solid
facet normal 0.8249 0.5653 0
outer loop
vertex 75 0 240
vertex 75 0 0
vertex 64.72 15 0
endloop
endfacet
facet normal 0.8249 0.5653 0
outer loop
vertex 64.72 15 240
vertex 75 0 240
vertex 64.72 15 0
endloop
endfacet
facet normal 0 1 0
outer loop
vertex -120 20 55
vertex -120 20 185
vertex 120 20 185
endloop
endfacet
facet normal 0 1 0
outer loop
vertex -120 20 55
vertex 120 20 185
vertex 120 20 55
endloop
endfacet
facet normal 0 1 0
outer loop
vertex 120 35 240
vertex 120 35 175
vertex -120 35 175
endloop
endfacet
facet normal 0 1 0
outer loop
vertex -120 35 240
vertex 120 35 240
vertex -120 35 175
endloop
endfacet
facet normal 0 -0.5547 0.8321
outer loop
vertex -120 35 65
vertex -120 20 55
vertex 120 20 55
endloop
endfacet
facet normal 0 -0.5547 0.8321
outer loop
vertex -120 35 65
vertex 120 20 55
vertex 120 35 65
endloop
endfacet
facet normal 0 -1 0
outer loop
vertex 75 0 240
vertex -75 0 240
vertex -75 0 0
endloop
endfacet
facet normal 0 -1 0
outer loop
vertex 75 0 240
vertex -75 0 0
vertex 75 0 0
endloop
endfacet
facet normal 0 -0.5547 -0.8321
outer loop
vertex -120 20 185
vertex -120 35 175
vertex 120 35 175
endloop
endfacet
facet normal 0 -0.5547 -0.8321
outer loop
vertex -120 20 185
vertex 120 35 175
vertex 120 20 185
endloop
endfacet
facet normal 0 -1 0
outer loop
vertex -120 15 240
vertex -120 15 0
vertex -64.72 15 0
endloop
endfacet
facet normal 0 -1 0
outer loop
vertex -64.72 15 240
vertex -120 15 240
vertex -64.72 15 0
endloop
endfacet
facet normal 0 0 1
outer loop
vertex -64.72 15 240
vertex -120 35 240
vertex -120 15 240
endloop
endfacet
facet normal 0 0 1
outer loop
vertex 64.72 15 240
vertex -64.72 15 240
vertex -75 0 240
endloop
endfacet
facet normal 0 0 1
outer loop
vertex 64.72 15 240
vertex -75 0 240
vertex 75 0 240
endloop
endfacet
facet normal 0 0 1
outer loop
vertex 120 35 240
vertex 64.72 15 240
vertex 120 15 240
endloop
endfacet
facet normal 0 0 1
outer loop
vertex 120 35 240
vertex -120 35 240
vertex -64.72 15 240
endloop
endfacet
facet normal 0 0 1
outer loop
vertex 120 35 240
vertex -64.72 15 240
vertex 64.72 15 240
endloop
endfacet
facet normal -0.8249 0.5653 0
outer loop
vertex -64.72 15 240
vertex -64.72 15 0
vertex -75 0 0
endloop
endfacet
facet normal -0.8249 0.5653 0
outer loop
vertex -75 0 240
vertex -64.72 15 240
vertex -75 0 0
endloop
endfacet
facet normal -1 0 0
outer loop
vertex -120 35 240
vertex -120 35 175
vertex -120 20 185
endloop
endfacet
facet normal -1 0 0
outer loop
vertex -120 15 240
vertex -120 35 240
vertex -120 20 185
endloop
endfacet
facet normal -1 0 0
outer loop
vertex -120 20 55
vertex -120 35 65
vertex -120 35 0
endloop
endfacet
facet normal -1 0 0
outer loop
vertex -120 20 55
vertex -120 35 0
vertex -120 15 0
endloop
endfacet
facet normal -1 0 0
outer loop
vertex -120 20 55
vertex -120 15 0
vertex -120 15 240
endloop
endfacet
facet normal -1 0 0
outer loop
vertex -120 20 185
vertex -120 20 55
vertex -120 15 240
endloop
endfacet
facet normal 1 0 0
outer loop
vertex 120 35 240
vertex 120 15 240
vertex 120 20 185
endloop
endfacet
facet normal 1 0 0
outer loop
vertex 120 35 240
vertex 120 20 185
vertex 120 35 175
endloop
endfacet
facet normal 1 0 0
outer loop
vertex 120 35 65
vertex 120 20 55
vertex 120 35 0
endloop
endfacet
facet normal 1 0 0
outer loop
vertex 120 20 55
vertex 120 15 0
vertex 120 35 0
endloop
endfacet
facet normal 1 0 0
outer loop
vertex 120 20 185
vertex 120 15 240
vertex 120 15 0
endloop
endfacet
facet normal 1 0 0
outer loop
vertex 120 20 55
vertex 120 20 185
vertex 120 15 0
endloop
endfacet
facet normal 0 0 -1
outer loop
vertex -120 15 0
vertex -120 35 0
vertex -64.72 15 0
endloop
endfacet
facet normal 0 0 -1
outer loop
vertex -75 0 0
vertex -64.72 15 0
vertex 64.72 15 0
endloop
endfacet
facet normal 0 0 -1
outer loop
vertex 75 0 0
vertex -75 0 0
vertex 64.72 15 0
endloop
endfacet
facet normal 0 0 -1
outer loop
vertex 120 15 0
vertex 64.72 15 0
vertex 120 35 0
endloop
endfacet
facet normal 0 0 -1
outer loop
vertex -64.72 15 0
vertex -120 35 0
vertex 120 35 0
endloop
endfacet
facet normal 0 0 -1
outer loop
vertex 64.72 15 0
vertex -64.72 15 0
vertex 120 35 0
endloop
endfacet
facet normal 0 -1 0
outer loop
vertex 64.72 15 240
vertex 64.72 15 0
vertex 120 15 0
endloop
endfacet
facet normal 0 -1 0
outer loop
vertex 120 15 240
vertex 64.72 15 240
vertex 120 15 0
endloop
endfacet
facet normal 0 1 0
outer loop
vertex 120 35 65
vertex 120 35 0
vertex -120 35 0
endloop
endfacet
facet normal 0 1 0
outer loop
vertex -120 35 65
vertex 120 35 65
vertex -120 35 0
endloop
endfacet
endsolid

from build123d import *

# Parameters (mm, degrees)
EXTRUDE_1_DEPTH     = 240
CUT_EXTRUDE_1_DEPTH = 241


with BuildPart() as part:
    # Эскиз1 → Бобышка-Вытянуть1 (new body)
    with BuildSketch(Plane.XY):
        Polygon((0, 0), (75, 0), (64.72, 15), (120, 15), (120, 35), (0, 35), (-120, 35), (-120, 15), (-64.72, 15), (-75, 0), align=None)
    extrude(amount=EXTRUDE_1_DEPTH)

    # Эскиз2 → Вырез-Вытянуть1 (cut, through all)
    with BuildSketch(Plane.ZY.offset(120)):
        Polygon((65, 35), (175, 35), (185, 20), (55, 20), align=None)
    extrude(amount=-CUT_EXTRUDE_1_DEPTH, mode=Mode.SUBTRACT)


solid = part.part
